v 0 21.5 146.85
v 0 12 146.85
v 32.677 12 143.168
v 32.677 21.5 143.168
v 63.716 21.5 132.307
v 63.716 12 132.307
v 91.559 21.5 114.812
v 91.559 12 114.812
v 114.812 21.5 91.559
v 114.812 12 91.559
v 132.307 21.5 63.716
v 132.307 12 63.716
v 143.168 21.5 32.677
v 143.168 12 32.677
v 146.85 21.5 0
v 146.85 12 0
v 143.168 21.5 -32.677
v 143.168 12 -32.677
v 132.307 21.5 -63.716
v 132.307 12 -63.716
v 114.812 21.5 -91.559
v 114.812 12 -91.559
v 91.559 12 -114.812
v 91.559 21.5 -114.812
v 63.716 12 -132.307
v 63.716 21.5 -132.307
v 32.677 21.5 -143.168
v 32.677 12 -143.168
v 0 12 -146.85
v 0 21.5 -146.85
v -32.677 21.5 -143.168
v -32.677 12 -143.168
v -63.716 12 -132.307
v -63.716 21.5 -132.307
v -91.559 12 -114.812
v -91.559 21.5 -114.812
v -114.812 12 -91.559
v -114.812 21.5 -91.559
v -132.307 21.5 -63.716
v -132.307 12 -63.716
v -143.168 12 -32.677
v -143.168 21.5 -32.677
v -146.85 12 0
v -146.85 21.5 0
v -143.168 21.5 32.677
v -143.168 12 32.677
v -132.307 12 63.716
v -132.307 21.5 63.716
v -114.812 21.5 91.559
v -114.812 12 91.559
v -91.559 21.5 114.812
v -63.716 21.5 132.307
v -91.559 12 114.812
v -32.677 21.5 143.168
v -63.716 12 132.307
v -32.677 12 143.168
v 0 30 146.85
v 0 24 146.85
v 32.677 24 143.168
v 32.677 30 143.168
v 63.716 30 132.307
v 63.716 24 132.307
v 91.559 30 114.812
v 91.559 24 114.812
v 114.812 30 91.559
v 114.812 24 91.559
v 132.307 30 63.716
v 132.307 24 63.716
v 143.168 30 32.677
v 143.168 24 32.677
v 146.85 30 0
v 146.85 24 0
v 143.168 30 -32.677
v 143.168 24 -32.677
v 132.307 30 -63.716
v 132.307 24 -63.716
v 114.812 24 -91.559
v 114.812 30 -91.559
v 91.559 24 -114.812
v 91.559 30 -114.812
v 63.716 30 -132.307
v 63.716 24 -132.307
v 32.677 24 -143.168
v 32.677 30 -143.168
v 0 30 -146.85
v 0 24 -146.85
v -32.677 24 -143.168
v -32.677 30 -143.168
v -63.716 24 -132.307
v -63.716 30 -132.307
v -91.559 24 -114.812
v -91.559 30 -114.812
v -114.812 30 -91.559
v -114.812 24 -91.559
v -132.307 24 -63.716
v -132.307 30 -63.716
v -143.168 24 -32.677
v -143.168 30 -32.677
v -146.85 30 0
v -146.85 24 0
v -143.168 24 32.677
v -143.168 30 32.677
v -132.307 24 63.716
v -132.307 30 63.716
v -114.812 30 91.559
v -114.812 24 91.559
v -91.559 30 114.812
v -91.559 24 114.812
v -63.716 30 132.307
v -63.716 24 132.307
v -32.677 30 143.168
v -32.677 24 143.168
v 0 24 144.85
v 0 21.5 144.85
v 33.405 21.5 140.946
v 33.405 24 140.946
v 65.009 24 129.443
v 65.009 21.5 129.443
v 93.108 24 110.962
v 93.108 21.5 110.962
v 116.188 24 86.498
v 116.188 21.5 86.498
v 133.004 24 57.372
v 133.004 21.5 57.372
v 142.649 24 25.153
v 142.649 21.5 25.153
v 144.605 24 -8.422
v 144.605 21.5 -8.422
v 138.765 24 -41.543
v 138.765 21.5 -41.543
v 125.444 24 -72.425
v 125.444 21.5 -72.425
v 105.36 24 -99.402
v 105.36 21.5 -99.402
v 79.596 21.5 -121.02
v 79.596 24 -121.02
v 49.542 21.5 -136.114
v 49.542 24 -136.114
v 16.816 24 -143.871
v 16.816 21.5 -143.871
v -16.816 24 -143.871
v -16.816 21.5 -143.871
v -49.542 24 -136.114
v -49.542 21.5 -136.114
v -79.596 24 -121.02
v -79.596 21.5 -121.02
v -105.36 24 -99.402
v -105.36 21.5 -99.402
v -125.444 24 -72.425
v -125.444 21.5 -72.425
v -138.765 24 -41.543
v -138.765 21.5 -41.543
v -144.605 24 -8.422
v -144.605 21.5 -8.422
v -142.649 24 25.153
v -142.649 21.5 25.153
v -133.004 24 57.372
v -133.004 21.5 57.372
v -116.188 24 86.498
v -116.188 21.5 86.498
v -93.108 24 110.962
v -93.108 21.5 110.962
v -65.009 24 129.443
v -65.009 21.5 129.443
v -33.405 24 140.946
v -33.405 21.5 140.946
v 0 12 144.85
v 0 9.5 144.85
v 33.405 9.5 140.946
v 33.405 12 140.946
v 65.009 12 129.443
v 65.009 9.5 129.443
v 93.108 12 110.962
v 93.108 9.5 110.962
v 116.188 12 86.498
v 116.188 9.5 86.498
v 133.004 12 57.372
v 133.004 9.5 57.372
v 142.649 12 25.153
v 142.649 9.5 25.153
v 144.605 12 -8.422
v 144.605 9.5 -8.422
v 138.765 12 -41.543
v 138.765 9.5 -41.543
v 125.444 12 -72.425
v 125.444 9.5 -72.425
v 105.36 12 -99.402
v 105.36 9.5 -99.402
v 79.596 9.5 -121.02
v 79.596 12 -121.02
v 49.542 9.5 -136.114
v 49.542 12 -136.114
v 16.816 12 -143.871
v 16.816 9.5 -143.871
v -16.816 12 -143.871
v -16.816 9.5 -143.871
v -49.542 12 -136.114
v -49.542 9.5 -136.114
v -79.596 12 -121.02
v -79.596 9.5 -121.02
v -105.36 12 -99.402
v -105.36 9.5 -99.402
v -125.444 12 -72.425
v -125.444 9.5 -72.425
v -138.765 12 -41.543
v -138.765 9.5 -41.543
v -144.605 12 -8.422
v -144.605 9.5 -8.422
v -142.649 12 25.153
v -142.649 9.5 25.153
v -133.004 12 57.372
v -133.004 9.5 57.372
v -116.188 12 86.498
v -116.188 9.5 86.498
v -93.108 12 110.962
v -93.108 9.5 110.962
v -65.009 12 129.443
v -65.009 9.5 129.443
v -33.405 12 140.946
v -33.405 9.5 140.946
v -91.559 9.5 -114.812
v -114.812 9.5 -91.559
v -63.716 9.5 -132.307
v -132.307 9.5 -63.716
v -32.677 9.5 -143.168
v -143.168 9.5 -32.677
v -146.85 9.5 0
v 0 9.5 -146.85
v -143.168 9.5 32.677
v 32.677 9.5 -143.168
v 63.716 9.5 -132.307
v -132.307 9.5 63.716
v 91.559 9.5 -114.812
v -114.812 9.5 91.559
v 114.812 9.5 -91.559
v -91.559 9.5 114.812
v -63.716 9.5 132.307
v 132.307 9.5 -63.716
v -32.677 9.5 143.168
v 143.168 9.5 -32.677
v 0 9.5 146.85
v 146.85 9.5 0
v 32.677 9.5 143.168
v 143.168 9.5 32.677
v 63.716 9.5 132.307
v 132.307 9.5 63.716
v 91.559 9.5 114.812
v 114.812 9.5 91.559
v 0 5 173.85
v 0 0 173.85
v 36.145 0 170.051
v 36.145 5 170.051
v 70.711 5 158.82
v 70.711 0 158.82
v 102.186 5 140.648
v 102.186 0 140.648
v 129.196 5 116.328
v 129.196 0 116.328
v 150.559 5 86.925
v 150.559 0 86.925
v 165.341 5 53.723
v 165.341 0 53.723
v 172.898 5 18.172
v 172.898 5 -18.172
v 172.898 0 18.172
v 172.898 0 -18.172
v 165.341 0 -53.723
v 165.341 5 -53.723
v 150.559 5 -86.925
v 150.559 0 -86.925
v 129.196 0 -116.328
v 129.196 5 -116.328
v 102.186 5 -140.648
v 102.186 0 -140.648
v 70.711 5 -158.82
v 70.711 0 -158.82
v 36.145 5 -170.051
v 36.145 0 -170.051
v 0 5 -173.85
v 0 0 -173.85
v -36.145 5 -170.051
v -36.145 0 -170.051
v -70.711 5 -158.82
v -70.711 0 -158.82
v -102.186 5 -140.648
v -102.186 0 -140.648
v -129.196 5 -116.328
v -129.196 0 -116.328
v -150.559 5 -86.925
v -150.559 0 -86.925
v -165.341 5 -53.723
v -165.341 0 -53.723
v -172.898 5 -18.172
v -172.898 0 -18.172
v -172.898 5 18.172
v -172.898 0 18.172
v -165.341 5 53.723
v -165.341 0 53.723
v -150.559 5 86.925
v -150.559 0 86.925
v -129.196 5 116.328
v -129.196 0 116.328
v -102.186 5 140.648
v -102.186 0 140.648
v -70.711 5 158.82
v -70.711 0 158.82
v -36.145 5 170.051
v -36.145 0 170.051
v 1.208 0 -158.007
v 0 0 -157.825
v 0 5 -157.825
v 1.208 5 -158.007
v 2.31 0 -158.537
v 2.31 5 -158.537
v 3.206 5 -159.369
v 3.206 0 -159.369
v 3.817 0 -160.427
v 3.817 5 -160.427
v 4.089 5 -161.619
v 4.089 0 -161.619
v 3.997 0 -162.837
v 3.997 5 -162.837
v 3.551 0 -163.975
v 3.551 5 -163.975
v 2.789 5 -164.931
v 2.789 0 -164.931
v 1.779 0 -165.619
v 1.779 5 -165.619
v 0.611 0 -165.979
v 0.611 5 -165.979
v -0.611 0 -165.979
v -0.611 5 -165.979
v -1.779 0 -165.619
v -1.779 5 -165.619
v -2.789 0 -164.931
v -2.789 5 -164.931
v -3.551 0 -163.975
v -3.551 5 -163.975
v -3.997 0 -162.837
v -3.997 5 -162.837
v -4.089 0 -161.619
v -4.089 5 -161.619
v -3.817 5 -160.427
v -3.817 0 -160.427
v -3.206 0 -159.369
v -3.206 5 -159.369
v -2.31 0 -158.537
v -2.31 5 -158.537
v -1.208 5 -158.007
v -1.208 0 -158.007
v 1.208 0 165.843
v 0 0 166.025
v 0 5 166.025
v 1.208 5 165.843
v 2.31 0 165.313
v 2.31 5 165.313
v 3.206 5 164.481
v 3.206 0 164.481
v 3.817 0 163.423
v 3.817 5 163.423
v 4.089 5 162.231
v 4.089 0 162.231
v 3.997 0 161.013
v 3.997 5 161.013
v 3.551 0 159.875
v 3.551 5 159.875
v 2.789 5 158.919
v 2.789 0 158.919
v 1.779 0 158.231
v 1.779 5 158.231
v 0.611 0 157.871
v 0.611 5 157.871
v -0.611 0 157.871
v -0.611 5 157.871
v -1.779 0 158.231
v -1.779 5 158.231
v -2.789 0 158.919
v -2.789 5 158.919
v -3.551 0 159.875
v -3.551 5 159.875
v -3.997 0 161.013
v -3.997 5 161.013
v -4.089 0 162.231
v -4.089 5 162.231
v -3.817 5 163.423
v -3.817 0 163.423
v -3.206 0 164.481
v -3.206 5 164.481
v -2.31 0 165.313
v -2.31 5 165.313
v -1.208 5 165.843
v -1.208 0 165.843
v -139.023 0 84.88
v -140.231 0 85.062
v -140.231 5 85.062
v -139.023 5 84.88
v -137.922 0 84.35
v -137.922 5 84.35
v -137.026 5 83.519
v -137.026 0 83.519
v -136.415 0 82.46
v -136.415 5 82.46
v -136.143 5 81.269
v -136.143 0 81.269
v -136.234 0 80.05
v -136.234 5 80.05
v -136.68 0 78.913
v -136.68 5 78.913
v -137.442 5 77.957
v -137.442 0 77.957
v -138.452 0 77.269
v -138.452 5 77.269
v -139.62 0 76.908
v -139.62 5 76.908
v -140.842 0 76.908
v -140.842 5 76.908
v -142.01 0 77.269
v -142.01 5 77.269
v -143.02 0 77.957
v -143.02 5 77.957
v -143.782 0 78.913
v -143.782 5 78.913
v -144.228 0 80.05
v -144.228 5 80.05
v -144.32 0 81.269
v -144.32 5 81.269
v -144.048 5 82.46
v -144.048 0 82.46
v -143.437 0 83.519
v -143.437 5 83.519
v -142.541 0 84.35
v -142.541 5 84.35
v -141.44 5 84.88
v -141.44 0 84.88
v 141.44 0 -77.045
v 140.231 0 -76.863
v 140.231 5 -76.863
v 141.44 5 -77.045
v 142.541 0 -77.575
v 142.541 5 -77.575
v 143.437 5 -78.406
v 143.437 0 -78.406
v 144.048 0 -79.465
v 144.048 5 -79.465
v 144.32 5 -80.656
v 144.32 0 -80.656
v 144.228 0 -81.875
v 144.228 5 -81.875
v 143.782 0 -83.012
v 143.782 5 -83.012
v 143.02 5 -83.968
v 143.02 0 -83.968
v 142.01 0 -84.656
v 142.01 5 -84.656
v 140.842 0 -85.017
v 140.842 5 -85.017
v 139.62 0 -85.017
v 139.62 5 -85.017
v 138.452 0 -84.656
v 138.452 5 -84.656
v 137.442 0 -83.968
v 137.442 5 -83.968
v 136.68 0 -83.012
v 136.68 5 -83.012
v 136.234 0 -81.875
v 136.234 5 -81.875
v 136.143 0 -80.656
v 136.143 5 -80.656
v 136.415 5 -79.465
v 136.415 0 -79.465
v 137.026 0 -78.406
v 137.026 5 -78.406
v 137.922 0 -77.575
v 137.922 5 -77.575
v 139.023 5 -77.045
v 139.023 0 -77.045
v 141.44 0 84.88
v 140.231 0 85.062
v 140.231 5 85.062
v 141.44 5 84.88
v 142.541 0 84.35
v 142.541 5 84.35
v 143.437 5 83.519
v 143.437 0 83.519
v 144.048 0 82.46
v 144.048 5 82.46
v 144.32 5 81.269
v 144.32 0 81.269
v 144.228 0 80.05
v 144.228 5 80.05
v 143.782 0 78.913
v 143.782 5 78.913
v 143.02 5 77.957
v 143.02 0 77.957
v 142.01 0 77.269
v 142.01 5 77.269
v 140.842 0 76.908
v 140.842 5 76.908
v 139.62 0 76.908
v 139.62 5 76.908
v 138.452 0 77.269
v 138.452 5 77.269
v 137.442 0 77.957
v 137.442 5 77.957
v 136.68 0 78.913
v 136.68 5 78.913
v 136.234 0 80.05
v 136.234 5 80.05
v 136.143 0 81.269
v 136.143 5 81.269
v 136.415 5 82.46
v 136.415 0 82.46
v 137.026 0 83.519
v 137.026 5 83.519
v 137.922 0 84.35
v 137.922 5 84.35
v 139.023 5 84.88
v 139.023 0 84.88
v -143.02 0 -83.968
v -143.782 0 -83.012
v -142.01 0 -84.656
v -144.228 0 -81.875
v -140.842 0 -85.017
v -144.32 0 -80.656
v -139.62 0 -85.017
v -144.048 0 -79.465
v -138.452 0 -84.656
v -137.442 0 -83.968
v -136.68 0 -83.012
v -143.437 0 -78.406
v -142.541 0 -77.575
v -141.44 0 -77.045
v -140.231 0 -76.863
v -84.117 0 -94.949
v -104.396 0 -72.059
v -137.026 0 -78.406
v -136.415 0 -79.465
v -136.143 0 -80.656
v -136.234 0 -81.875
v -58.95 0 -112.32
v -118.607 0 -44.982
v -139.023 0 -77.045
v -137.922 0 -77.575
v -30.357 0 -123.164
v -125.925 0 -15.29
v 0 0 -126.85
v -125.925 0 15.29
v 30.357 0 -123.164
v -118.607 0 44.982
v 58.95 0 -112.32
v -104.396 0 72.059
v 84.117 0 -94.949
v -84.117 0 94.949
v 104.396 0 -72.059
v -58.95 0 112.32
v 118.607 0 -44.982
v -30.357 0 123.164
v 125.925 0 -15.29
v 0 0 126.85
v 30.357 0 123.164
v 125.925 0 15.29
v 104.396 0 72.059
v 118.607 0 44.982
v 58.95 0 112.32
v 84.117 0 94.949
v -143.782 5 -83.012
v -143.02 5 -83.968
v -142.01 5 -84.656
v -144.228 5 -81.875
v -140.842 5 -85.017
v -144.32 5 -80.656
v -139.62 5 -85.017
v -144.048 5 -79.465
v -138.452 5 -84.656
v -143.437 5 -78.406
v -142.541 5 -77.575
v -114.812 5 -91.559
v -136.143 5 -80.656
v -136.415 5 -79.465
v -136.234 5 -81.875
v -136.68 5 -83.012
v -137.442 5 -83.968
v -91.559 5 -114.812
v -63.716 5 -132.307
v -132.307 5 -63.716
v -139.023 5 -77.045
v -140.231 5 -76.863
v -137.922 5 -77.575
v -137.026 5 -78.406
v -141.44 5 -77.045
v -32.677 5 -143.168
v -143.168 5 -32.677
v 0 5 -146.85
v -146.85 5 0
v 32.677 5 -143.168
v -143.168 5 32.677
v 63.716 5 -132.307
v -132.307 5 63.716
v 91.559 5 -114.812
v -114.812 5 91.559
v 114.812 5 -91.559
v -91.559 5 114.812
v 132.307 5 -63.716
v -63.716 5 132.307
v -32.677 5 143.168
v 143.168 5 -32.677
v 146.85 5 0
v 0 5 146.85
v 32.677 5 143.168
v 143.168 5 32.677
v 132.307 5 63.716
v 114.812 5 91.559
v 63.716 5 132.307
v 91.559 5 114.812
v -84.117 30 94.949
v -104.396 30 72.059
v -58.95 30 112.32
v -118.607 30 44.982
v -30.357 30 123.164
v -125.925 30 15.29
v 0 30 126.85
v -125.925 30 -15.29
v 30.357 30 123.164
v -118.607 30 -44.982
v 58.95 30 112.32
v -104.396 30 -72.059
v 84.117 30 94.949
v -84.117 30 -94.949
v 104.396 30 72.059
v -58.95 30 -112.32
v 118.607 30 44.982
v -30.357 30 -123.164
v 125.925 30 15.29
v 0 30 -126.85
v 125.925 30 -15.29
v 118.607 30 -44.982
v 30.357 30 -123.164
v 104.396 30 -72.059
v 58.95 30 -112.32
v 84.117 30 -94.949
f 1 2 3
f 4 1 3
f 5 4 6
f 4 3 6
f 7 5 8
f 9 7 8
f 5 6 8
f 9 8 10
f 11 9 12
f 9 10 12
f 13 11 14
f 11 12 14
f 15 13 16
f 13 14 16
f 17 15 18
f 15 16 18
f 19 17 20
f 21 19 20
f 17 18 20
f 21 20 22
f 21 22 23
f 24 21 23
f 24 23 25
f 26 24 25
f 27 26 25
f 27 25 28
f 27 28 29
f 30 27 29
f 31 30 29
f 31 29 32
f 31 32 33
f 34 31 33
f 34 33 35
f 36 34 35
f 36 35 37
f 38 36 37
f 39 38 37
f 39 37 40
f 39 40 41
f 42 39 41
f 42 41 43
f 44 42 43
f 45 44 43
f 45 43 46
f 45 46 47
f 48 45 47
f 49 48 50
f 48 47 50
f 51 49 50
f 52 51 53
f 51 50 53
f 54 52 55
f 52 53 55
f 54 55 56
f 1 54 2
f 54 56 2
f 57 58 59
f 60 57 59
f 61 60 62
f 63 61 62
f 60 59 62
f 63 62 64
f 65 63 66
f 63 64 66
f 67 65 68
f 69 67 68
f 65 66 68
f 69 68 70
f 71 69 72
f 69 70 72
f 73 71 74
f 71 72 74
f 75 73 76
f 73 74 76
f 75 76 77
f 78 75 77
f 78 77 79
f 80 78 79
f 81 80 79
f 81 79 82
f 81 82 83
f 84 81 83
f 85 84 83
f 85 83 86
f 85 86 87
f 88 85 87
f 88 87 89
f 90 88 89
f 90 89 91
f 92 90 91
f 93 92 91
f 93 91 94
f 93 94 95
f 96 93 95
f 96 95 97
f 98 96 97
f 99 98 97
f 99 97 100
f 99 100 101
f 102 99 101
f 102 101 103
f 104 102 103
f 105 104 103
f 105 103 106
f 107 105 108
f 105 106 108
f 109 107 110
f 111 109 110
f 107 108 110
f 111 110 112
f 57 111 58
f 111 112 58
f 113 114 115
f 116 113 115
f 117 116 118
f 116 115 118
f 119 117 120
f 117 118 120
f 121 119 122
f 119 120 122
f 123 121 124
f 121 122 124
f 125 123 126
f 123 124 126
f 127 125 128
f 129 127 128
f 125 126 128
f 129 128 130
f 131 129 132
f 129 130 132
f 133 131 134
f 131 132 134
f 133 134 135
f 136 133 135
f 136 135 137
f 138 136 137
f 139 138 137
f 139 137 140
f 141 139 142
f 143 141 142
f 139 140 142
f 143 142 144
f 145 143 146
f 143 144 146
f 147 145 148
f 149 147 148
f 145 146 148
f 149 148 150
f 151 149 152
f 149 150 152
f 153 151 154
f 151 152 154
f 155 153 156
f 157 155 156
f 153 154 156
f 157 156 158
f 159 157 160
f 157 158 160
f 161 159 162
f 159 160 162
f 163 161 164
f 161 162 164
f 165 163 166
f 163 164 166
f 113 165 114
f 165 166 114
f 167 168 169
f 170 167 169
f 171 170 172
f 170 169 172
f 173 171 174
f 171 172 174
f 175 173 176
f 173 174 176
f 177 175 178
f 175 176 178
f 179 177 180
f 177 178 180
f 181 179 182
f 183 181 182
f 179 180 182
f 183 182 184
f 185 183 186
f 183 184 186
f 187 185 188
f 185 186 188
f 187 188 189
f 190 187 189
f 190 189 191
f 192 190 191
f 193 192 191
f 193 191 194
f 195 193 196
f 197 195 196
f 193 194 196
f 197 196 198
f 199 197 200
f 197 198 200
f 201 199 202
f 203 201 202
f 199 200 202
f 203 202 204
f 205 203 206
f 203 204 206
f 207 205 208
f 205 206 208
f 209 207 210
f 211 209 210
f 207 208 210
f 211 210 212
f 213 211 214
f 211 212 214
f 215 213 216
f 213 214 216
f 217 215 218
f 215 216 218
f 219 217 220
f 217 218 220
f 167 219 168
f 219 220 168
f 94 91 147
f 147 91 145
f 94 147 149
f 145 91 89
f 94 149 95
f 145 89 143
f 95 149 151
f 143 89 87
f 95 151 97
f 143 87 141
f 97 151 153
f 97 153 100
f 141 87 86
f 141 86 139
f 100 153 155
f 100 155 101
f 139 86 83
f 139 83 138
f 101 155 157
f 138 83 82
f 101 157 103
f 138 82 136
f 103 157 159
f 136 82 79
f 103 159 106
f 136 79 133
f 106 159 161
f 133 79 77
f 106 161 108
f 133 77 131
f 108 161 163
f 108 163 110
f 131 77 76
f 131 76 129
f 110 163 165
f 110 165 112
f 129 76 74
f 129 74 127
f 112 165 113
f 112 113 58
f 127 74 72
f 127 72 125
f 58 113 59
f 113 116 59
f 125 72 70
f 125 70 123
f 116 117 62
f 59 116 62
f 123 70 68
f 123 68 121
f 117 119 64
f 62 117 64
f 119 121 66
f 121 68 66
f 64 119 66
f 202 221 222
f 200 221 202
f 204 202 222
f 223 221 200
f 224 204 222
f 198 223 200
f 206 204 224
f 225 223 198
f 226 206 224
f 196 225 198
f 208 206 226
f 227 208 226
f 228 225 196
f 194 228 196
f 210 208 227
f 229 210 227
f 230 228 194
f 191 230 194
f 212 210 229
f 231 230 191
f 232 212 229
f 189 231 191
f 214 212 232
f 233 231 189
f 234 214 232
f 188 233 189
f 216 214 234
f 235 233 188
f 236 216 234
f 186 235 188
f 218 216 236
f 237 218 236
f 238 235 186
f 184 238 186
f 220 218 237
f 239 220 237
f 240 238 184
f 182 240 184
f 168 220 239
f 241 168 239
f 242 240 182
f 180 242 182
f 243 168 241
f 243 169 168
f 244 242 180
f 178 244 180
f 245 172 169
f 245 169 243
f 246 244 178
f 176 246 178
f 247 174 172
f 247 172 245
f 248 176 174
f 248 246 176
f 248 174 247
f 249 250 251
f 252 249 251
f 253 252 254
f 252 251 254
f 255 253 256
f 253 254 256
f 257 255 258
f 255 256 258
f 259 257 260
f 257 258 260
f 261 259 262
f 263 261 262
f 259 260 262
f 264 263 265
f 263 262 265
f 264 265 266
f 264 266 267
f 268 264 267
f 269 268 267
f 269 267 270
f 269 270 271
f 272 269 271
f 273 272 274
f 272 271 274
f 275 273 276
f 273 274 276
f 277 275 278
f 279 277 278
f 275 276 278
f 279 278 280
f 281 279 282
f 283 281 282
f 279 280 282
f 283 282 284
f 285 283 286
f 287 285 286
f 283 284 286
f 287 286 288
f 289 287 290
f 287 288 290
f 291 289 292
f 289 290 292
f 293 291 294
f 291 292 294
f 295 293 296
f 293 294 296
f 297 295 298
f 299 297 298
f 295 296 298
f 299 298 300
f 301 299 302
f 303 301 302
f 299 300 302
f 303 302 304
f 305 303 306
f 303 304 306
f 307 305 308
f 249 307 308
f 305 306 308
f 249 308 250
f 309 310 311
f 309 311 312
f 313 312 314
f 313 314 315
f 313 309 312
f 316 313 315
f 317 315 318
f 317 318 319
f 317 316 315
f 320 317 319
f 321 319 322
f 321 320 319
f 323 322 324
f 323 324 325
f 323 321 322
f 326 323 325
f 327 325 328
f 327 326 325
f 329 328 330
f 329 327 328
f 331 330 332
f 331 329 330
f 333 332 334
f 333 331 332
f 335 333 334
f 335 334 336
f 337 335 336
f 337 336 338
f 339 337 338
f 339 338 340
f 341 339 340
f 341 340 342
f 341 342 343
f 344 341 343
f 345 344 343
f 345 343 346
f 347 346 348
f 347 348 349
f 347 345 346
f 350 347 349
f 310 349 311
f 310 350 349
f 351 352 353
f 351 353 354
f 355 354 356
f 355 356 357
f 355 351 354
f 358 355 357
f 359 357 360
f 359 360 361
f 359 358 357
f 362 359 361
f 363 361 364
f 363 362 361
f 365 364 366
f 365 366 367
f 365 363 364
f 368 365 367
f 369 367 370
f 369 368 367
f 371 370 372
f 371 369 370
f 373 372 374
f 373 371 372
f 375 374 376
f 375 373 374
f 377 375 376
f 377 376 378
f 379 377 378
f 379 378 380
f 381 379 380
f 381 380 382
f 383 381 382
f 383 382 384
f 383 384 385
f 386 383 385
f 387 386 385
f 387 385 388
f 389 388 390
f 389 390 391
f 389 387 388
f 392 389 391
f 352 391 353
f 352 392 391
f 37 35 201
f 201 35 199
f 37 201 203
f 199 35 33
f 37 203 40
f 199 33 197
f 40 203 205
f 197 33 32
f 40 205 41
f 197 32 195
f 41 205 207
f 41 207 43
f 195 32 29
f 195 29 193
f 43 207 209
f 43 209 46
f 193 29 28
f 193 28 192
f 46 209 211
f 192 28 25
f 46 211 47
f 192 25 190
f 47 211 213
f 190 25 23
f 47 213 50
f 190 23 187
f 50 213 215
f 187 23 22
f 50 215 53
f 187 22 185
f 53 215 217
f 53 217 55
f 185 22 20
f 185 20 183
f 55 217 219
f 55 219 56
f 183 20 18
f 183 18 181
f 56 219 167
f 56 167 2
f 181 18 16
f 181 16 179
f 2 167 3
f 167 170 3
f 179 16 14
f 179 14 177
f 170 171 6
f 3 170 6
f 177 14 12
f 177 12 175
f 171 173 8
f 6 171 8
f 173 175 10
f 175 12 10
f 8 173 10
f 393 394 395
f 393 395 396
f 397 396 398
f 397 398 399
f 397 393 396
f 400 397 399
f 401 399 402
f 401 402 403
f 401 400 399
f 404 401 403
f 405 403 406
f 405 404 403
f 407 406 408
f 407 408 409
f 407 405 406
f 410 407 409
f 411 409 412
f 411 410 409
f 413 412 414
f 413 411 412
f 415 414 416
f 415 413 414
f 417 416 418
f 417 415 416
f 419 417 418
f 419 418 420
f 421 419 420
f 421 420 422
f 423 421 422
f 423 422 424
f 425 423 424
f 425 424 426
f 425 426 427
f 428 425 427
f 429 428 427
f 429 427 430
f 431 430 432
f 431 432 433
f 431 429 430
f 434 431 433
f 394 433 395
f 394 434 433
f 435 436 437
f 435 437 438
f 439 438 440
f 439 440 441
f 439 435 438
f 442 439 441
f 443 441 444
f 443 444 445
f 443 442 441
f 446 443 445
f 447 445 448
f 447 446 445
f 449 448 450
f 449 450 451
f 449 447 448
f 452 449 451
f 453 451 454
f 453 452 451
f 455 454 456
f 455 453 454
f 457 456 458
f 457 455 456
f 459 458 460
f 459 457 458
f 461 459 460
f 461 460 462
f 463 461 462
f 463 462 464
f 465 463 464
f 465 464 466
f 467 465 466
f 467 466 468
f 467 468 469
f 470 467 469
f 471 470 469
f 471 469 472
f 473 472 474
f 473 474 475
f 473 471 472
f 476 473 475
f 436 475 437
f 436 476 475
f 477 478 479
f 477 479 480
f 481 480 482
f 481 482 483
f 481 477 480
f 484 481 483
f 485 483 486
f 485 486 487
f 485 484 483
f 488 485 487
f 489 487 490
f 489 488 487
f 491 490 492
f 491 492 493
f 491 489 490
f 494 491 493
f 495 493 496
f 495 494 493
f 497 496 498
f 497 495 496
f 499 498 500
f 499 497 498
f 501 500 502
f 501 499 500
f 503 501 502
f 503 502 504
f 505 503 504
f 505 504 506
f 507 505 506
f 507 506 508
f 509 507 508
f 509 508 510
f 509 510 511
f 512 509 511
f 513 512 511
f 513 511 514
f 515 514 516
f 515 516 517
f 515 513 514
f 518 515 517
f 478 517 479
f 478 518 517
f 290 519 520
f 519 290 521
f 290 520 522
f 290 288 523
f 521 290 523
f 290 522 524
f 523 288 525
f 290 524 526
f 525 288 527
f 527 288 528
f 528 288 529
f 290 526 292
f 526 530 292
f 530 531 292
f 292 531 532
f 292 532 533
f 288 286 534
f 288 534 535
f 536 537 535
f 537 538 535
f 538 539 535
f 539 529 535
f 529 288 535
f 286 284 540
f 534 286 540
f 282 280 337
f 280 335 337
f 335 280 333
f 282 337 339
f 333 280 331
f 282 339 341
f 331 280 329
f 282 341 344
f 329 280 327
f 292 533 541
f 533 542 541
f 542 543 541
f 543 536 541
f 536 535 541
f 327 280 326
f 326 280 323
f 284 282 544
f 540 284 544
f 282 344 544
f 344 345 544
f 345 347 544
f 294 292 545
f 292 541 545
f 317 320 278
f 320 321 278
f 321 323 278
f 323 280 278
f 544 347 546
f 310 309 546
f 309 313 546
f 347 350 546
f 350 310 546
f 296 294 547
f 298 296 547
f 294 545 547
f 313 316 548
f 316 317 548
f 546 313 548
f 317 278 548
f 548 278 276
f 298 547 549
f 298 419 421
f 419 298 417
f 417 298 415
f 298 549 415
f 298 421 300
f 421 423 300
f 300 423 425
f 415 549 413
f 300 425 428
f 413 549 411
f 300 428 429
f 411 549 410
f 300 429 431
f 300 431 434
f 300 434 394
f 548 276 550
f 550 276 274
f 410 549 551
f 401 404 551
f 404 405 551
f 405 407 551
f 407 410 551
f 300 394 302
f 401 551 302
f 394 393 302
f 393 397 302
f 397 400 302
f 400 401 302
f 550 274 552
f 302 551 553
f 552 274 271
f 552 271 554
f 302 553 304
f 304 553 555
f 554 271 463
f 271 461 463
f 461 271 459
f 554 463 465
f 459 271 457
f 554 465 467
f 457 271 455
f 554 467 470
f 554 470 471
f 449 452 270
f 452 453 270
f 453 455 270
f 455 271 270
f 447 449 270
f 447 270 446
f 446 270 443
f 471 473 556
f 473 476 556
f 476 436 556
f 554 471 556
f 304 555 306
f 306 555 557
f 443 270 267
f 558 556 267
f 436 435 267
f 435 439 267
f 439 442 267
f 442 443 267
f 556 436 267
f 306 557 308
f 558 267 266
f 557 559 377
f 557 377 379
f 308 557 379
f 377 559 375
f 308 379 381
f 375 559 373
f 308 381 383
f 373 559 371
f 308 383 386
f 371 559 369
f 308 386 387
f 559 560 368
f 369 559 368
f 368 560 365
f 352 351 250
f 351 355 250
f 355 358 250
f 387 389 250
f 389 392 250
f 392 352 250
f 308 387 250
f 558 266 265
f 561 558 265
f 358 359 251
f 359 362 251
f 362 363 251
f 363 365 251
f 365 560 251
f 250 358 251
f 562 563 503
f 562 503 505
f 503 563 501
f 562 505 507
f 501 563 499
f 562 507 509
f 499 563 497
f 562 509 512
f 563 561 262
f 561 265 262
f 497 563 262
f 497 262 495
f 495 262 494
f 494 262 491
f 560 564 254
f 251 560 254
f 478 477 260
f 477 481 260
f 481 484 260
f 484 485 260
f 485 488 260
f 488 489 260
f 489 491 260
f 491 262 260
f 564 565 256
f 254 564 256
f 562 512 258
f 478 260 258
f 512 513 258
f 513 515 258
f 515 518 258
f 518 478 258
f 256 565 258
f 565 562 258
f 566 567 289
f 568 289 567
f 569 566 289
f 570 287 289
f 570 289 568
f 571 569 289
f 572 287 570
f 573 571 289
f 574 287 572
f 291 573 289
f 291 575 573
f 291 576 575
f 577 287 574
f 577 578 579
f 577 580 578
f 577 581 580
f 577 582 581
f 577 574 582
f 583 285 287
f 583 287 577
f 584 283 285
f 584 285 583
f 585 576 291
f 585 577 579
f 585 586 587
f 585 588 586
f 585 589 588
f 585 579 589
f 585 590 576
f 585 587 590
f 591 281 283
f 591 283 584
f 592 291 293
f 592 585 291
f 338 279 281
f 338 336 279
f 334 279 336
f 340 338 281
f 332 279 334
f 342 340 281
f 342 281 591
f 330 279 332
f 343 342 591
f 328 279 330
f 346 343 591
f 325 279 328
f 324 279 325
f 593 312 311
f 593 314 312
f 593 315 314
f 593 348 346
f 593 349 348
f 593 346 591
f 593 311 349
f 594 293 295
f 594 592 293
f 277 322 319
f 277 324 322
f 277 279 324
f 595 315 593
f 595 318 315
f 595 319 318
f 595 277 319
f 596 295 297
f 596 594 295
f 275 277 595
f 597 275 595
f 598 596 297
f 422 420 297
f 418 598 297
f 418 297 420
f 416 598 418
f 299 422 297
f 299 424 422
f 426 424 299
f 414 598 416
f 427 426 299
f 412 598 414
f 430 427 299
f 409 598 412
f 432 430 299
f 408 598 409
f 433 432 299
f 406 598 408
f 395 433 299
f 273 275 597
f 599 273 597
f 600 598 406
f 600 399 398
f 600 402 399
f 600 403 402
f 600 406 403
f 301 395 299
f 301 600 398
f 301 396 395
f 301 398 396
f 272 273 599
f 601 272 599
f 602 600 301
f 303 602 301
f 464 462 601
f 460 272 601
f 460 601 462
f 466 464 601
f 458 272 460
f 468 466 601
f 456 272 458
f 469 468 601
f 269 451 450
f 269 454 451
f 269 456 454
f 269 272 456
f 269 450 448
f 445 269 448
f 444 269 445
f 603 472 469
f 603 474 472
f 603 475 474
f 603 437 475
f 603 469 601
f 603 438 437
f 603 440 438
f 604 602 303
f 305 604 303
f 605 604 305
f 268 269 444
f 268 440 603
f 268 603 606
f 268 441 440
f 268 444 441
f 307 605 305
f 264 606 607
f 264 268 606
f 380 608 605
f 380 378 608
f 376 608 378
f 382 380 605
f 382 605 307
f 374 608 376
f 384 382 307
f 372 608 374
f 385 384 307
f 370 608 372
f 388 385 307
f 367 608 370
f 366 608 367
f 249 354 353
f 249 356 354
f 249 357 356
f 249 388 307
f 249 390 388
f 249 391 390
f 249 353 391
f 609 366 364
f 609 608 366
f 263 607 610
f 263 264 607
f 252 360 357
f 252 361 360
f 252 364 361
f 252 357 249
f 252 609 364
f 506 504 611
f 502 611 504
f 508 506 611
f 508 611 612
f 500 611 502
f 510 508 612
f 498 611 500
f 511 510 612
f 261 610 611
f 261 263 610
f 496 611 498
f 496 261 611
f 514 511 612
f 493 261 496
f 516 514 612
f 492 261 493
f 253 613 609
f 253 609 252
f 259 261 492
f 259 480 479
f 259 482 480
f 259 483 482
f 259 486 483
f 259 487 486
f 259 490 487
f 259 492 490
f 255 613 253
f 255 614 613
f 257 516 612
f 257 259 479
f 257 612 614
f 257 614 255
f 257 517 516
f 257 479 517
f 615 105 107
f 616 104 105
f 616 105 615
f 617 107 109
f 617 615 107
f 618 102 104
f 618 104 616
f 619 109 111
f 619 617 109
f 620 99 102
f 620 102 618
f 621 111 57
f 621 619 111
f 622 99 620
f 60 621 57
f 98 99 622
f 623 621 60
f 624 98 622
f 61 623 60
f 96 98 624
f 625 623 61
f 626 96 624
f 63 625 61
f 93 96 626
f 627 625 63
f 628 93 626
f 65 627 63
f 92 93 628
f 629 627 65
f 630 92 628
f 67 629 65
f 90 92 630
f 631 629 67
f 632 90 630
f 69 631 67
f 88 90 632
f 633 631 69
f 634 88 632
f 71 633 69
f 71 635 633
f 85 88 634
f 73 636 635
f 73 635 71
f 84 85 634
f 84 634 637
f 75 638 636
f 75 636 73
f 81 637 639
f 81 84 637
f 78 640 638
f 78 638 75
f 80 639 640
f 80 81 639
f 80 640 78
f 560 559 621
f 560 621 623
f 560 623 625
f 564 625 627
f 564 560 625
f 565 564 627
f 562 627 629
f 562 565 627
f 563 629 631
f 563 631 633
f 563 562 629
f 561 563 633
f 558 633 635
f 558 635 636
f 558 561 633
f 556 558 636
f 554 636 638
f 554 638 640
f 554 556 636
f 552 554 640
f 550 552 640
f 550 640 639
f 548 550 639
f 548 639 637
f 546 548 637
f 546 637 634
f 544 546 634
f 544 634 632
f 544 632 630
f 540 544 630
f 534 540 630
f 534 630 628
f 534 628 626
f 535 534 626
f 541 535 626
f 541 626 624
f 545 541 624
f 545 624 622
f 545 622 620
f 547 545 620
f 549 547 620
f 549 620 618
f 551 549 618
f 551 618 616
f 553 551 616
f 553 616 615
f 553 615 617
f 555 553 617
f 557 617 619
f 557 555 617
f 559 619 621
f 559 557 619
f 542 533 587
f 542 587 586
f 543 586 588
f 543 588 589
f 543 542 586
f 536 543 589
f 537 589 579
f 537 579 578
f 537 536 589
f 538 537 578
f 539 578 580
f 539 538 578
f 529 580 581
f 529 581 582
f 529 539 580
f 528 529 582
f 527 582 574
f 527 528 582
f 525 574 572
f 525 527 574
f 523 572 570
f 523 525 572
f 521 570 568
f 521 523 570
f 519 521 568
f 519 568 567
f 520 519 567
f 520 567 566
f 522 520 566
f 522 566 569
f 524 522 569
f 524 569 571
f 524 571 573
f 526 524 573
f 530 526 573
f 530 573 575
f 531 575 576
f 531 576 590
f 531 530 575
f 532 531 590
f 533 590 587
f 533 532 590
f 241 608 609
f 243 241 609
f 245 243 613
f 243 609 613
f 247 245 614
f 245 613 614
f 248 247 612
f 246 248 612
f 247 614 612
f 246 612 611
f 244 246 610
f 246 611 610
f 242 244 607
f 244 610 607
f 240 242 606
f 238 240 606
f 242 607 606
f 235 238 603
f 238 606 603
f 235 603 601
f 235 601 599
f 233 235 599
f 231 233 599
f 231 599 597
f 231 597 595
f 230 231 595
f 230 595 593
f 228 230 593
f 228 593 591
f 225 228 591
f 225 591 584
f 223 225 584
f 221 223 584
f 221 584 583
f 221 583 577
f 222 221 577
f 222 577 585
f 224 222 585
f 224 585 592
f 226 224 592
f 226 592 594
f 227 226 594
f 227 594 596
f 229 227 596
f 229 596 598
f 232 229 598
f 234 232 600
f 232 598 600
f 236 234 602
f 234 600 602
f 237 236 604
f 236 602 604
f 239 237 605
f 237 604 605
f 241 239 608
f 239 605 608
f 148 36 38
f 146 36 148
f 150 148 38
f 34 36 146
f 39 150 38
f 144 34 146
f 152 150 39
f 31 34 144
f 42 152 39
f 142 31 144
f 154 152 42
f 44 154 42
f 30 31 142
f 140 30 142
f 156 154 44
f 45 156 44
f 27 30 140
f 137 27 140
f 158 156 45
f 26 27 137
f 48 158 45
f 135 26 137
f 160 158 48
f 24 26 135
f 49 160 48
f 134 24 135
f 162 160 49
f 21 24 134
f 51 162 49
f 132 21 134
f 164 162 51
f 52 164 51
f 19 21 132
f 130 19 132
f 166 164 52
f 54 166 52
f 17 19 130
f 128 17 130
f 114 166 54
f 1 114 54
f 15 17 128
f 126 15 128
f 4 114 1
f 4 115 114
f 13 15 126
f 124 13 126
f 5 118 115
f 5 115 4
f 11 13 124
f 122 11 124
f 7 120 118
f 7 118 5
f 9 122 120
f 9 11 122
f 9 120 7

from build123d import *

# Parameters (mm, degrees)
SKETCH1_R           = 173.85
SKETCH1_R_2         = 4.1
SKETCH1_R_3         = 126.85
BOSS_EXTRUDE1_DEPTH = 5
SKETCH1_3_R         = 146.85
SKETCH1_3_R_2       = 126.85
BOSS_EXTRUDE2_DEPTH = 30
CUT_EXTRUDE1_START  = 9.5
SKETCH1_4_R         = 146.85
SKETCH1_4_R_2       = 144.85
CUT_EXTRUDE1_DEPTH  = 2.5
CUT_EXTRUDE2_START  = 21.5
SKETCH1_5_R         = 146.85
SKETCH1_5_R_2       = 144.85
CUT_EXTRUDE2_DEPTH  = 2.5


with BuildPart() as part:
    # Sketch1 → Boss-Extrude1 (new body)
    with BuildSketch(Plane(origin=(0, 0, 0), x_dir=(1, 0, 0), z_dir=(0, 1, 0))):
        Circle(SKETCH1_R)
        with Locations((-140.231163508, -80.9625)):
            Circle(SKETCH1_R_2, mode=Mode.SUBTRACT)
        with Locations((0, -161.925)):
            Circle(SKETCH1_R_2, mode=Mode.SUBTRACT)
        with Locations((140.231163508, -80.9625)):
            Circle(SKETCH1_R_2, mode=Mode.SUBTRACT)
        with Locations((-140.231163508, 80.9625)):
            Circle(SKETCH1_R_2, mode=Mode.SUBTRACT)
        with Locations((0, 161.925)):
            Circle(SKETCH1_R_2, mode=Mode.SUBTRACT)
        with Locations((140.231163508, 80.9625)):
            Circle(SKETCH1_R_2, mode=Mode.SUBTRACT)
        Circle(SKETCH1_R_3, mode=Mode.SUBTRACT)
    extrude(amount=BOSS_EXTRUDE1_DEPTH)

    # Sketch1<3> → Boss-Extrude2 (add)
    with BuildSketch(Plane(origin=(0, 0, 0), x_dir=(1, 0, 0), z_dir=(0, 1, 0))):
        Circle(SKETCH1_3_R)
        Circle(SKETCH1_3_R_2, mode=Mode.SUBTRACT)
    extrude(amount=BOSS_EXTRUDE2_DEPTH)

    # Sketch1<4> → Cut-Extrude1 (cut)
    with BuildSketch(Plane(origin=(0, 0, 0), x_dir=(1, 0, 0), z_dir=(0, 1, 0)).offset(CUT_EXTRUDE1_START)):
        Circle(SKETCH1_4_R)
        Circle(SKETCH1_4_R_2, mode=Mode.SUBTRACT)
    extrude(amount=CUT_EXTRUDE1_DEPTH, mode=Mode.SUBTRACT)

    # Sketch1<5> → Cut-Extrude2 (cut)
    with BuildSketch(Plane(origin=(0, 0, 0), x_dir=(1, 0, 0), z_dir=(0, 1, 0)).offset(CUT_EXTRUDE2_START)):
        Circle(SKETCH1_5_R)
        Circle(SKETCH1_5_R_2, mode=Mode.SUBTRACT)
    extrude(amount=CUT_EXTRUDE2_DEPTH, mode=Mode.SUBTRACT)


solid = part.part
